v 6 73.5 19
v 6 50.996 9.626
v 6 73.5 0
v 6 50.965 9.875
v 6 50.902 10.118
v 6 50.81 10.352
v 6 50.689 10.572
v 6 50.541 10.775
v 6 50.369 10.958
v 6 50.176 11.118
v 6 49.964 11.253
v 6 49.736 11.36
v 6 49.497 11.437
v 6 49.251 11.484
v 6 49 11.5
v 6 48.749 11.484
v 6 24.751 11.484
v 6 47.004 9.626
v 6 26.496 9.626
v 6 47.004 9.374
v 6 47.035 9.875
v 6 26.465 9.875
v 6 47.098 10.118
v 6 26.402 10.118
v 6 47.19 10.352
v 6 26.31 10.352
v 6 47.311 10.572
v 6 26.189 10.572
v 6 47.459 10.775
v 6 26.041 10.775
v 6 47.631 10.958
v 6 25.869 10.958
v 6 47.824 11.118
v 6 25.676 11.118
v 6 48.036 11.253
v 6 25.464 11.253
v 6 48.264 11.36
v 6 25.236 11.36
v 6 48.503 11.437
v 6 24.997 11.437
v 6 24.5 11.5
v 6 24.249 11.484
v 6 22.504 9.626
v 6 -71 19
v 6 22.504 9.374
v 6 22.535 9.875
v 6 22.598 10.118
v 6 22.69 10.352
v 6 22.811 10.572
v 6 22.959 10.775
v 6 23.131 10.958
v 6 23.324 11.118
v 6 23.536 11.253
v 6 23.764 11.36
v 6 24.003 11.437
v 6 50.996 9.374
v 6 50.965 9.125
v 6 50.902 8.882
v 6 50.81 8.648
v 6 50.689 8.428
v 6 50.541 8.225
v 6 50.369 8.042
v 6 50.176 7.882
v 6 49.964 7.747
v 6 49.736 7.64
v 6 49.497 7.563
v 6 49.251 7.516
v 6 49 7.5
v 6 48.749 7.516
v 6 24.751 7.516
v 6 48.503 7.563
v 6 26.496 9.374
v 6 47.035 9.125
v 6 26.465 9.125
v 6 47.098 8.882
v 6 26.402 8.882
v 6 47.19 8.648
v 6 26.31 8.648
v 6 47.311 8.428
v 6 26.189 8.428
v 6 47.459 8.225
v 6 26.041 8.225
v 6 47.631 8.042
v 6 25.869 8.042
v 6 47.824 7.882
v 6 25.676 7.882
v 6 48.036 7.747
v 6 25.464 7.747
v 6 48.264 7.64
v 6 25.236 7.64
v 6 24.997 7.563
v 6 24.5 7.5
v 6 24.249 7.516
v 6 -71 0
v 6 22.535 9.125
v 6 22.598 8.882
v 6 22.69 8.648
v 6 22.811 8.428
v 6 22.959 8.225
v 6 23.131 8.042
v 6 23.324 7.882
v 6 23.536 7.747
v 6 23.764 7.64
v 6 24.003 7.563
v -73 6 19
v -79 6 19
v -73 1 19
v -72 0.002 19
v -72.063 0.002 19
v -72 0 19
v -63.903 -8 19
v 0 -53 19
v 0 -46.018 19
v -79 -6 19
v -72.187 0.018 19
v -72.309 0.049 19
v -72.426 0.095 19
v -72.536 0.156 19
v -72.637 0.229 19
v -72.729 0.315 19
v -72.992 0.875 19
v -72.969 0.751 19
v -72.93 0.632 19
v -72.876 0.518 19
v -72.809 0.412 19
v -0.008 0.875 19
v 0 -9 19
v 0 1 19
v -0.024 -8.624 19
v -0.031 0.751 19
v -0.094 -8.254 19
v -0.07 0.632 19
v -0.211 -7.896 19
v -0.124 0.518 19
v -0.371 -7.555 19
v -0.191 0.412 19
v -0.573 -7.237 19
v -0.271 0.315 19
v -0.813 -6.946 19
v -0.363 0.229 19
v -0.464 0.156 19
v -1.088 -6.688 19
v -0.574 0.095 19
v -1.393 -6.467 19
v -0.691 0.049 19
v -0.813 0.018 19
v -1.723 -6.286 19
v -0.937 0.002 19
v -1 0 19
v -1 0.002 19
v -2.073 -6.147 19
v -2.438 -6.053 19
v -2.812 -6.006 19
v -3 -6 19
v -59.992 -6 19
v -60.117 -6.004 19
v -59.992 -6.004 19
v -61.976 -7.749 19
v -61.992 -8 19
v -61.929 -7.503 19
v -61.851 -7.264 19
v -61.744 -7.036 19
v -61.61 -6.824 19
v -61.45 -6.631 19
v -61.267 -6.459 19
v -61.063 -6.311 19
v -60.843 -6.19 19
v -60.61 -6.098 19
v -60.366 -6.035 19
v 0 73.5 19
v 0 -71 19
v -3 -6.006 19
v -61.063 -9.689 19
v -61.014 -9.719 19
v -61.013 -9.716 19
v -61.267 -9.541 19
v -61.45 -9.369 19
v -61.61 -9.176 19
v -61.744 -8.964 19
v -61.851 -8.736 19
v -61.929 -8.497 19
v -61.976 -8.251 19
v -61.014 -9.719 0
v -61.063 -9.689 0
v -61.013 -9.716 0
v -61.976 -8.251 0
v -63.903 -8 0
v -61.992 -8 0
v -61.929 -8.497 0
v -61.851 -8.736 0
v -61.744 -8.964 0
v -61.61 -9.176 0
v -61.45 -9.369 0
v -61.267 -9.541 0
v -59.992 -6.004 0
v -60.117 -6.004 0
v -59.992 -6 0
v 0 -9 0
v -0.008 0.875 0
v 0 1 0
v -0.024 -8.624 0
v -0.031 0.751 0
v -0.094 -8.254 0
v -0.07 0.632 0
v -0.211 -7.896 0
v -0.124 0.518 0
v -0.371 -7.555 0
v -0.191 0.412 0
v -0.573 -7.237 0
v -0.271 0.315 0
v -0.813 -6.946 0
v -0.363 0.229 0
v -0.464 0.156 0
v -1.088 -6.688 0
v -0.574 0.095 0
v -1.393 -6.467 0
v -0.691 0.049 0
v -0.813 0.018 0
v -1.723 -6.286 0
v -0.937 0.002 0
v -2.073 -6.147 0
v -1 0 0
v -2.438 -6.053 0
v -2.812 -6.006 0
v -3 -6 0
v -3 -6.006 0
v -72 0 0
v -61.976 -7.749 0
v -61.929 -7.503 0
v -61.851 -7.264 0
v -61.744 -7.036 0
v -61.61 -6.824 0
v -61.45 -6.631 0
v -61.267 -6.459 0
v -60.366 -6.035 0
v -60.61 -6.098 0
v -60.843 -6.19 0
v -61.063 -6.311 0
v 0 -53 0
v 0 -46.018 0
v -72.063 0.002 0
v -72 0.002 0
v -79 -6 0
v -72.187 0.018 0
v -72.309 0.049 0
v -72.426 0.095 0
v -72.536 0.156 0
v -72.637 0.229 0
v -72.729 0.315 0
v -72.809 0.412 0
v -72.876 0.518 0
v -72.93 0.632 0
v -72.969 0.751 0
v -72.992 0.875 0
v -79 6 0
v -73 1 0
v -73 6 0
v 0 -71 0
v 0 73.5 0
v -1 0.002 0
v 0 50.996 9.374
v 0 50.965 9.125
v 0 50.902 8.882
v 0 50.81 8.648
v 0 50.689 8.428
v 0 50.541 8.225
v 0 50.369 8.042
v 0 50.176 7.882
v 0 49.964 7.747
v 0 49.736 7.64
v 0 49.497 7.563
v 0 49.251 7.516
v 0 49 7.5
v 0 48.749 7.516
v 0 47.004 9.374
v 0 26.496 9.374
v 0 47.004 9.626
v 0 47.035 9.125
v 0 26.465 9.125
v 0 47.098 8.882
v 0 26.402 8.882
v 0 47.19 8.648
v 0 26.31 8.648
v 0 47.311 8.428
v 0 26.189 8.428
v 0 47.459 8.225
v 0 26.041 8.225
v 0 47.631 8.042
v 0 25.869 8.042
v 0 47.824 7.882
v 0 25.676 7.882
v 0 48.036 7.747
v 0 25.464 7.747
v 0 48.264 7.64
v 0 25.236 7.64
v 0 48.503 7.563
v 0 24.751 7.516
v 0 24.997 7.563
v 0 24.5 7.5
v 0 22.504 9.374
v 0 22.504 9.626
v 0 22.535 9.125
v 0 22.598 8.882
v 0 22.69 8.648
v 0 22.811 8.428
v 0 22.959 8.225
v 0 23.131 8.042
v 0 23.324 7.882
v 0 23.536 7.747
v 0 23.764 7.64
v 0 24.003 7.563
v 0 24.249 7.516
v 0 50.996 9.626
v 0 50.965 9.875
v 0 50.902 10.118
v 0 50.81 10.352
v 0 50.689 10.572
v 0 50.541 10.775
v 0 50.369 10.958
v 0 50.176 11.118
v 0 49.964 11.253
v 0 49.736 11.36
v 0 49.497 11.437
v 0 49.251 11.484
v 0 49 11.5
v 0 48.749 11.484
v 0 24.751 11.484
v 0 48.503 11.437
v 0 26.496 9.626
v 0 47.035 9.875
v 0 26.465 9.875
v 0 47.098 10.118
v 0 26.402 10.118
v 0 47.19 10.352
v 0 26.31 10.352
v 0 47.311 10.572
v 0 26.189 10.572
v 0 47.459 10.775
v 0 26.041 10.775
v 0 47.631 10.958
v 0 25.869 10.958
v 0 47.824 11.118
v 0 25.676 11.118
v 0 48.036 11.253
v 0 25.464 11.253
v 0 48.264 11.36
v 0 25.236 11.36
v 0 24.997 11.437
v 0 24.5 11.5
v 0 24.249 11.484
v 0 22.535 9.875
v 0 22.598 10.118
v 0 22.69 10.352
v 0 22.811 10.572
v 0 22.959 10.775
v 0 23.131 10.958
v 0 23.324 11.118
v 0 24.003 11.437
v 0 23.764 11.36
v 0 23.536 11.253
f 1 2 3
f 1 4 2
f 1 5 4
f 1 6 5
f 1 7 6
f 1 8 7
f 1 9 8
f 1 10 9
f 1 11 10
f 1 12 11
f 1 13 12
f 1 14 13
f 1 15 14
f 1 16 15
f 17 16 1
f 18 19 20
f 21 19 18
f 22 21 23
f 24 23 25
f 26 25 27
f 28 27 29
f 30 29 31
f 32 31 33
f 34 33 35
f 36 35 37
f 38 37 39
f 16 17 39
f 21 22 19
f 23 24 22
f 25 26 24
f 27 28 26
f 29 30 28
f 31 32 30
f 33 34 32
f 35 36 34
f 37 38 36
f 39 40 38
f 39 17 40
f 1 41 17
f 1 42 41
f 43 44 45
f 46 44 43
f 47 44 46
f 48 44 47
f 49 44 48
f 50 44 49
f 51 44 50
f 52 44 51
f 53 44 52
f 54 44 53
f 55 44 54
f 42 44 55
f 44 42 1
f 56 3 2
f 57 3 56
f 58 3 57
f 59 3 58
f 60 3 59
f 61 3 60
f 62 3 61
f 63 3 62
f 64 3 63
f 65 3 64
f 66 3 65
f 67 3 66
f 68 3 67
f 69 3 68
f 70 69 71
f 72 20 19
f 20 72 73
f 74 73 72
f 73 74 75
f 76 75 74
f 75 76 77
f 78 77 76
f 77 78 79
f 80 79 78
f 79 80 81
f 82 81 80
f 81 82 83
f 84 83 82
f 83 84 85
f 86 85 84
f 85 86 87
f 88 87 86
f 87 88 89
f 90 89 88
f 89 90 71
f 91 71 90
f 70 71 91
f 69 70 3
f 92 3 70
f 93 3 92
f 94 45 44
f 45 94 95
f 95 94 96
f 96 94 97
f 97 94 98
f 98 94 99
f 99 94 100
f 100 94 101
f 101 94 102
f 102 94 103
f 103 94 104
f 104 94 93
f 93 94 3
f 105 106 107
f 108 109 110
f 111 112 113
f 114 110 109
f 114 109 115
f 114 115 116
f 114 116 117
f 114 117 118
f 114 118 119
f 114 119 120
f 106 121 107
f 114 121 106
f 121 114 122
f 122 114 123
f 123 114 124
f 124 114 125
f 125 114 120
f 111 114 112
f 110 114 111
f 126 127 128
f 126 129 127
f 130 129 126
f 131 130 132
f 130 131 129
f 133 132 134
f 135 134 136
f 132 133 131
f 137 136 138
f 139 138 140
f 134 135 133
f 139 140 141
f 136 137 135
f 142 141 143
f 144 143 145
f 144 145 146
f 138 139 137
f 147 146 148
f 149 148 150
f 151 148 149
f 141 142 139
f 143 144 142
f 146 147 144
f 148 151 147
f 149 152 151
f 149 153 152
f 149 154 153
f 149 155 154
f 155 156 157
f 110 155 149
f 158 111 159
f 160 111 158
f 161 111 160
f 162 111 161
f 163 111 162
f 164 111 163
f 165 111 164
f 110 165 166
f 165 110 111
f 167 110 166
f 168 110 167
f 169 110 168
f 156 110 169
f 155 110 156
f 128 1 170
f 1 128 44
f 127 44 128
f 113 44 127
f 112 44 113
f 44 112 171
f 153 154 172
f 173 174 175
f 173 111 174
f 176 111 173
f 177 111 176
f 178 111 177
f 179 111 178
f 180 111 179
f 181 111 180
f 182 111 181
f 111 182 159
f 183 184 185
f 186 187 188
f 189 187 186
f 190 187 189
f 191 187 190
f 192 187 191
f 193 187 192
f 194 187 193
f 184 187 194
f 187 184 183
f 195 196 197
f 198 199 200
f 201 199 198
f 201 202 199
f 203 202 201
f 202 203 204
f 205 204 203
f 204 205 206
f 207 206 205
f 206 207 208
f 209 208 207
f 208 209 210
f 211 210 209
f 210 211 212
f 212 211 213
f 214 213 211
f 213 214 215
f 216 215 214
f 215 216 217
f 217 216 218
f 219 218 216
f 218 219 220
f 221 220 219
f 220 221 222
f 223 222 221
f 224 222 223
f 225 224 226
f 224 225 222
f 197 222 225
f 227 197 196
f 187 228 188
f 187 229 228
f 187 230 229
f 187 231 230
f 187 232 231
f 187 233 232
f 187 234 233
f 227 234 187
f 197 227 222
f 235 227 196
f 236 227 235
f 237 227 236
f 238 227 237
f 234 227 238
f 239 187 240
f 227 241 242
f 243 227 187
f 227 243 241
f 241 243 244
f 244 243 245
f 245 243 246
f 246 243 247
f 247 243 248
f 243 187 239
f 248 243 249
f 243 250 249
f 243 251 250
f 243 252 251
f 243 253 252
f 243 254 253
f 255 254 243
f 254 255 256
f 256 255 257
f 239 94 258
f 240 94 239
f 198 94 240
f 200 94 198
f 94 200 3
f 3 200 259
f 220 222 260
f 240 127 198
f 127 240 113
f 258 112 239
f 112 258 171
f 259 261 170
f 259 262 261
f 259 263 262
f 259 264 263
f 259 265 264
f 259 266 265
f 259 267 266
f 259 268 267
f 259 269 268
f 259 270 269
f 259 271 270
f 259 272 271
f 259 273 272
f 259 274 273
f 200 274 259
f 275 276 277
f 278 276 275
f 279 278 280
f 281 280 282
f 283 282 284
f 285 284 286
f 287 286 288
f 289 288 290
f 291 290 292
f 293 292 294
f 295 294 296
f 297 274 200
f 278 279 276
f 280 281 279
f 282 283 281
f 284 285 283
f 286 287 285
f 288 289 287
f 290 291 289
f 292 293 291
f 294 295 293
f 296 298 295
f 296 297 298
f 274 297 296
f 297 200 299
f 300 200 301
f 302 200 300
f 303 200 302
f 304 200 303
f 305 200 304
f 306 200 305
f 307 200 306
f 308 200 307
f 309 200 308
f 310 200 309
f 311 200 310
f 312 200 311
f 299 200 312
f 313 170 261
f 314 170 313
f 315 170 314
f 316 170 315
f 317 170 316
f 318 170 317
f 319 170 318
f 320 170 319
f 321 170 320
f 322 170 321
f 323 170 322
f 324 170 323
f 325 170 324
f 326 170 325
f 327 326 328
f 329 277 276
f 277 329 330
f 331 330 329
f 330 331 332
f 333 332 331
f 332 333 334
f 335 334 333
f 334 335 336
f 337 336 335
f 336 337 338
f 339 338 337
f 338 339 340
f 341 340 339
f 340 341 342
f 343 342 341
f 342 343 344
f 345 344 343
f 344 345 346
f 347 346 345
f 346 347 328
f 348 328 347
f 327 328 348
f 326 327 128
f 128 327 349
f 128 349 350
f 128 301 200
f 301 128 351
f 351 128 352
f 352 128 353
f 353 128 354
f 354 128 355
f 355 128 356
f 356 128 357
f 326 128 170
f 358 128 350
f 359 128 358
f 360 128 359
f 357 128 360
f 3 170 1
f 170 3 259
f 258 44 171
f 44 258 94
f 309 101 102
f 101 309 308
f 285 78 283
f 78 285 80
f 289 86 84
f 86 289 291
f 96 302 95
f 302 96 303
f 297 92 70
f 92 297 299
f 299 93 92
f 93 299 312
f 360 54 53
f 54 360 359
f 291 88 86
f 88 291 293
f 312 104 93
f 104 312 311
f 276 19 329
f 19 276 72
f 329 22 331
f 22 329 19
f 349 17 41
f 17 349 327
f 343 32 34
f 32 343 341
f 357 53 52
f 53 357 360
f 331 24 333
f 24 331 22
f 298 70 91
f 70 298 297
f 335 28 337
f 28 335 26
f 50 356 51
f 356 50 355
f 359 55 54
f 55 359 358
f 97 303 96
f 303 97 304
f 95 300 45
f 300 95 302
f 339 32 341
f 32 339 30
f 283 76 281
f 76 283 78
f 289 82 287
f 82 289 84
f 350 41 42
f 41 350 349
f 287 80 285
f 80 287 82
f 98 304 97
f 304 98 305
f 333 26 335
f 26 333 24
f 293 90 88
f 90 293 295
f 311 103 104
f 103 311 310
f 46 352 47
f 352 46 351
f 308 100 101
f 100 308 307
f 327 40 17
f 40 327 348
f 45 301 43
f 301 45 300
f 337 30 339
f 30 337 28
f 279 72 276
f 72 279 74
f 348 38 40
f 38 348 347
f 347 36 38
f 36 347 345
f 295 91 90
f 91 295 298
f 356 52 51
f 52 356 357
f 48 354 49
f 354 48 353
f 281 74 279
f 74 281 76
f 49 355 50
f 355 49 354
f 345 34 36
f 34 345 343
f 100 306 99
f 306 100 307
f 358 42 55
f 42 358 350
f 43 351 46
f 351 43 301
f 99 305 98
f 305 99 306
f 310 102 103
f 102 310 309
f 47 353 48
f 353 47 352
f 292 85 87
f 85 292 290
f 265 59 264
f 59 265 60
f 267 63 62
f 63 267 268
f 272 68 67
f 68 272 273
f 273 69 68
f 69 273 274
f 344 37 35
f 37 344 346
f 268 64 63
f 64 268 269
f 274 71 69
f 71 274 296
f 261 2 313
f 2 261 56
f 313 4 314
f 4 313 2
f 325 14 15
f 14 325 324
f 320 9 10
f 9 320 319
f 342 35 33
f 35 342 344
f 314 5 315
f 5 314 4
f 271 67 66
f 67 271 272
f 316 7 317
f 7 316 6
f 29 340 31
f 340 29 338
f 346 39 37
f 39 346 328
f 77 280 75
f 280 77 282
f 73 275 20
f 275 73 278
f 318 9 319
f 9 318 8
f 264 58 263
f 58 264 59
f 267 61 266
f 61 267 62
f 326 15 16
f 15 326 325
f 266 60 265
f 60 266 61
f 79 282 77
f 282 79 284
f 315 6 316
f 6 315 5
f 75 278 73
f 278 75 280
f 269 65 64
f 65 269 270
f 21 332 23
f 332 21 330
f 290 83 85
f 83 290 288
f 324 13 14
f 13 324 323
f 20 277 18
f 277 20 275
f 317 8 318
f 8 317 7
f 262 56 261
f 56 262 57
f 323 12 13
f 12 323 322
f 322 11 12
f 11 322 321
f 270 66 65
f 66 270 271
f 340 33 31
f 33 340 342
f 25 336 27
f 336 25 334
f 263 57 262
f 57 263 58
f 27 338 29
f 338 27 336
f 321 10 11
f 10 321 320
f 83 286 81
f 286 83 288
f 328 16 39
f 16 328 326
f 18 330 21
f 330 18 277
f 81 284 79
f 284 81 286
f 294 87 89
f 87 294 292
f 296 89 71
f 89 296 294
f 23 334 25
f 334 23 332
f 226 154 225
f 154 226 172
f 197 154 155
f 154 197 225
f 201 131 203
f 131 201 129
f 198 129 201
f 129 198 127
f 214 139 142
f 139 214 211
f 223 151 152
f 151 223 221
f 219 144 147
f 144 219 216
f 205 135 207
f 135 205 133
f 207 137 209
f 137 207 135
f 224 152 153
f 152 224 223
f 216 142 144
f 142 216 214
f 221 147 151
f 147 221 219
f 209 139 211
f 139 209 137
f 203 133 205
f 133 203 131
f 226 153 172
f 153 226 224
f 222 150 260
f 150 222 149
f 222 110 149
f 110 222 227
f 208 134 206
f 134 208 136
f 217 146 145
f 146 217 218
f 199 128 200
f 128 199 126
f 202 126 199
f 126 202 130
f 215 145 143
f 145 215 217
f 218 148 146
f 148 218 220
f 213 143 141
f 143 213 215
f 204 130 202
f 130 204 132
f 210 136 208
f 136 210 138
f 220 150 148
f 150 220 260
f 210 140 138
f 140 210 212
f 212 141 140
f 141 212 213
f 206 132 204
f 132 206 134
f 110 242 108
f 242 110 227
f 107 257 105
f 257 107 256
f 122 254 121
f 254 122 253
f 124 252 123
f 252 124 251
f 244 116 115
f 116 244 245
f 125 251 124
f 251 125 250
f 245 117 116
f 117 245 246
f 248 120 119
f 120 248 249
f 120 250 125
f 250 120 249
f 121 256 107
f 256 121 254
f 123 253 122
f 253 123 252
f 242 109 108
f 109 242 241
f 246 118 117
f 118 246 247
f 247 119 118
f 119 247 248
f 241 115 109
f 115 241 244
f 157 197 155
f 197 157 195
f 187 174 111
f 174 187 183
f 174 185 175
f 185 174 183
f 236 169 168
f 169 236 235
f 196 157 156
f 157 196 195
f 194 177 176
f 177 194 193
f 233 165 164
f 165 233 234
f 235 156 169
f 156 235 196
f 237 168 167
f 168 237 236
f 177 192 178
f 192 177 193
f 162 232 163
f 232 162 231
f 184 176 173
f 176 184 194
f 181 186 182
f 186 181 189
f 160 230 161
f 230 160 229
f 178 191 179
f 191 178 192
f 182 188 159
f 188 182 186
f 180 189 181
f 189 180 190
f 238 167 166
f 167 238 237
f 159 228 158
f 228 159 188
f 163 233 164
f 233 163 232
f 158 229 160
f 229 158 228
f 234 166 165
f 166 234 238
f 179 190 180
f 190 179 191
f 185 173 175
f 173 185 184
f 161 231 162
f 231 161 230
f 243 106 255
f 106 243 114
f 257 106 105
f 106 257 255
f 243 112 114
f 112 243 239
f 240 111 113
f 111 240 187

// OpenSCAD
/* [user roll dimensions] */
    diametre_rouleau=200;// [150:200]
    epaisseur_rouleau=71;// [30:77]
    diametre_trou=53;// [32:60]

/* [Hidden] */
    es=6;//epaisseur structure
    Hauteur_z=19;
    GR=3;//grands rayons
    pr=1;//petits rayons
    preview_tab = "";

//Calculs dimensionnels
    epaulement=((diametre_rouleau/2)-(diametre_trou/2));//extérieur rouleau à bord trou du rouleau
    portee=(epaisseur_rouleau+2+es);//jeu=2
    longueur_renfort=sqrt((portee*portee)+((diametre_trou-es)*(diametre_trou-es)));//du bout de la portee au bord inférieur du trou du rouleau
    ang=atan(portee/(diametre_trou-es));//angle de rotation du renfort
    angsmall=180-(90+ang);//angle de la pointe de la portée
    sx=2*(sin (angsmall));//localisation en x du point de tangence du rayon sur le renfort
    sy=2*(cos (angsmall));//localisation en y du point de tangence du rayon sur le renfort
    lx=(sy+2)/(tan (angsmall));//localisation en x du point de tangence du rayon sur la portée
    decalage=es/(sin (angsmall));//longueur du chevauchement de la portée et du renfort

//Dessin du support mural
 union() {
        //Dessin de la partie au mur
        //Example: translate(v = [x, y, z]) { ... }
        //x=es;
        y=epaulement+diametre_trou+(es*3);
        z=Hauteur_z;
        //echo(box=[es, y, z]);
     
        difference () {
            translate([0,-(diametre_trou+(es*3)),0])
                cube([es,y,z],false);
            translate([-a4,epaulement/3,z/2])
                rotate ([0,90,0]) 
                    cylinder(es+2,r=2, $fn=50,center=false);
            translate([-a4,(epaulement/3)*2,z/2])
                rotate ([0,90,0]) 
                    cylinder(es+2,r=2, $fn=50,center=false);
         };
     
        //Dessin de la portee
        a=portee;
        translate([-a,-es,0])
            cube([a,es,z],false);
        
        //Dessin de la butée d'extrémité
        translate ([-a,0,0]) 
            cube([es,es,z],false);
        
        //Dessin du renfort
        b2=longueur_renfort;
        translate([0,-(diametre_trou),0])
            rotate([0,0,ang])
                cube([es,b2,z]);
        
        //Dessin du rayon mur-dessous portee
        a3=3;
        b3=3;
        translate([-a3,-(es+b3),0])
            difference(){
                cube([a3,b3,z],false);
                translate([0,0,-1])
                cylinder(z+2,r=a3,$fn=50,center=false);
            };//fin de la difference
        
        //Dessin du rayon mur-dessus portee
        a4=1;
        b4=1;
        r=a4;
        L4=z+2;
        
        difference(){
            translate([-a4,0,0])
                cube([a4,b4,z],false);
            translate([-a4,b4,-1])
                cylinder(L4,r, $fn=50,center=false);
            };//fin de la difference
        
        difference(){
            translate([-(a-es),0,0]) 
                cube([a4,b4,z],false);
            translate([-(a-es-a4),b4,-1])
                cylinder(L4,r, $fn=50,center=false);
            };//fin de la difference
        
        difference(){
            union (){
                translate([-(a-lx-decalage-sx),-es-2,0])
                    rotate ([0,0,90])
                        cube([2,lx+sx,z],false);
                translate([-(a-lx-decalage),-(es+2+sy),0])
                    rotate ([0,0,ang])
                        cube([2,lx+sx,z],false);
            };//fin de l'union
            translate ([-(a-lx-decalage-sx),-es-2,-1]) 
                cylinder (h=(z+2),r=2,$fn=50,center=false);
        };//fin de la difference
        
};//fin de l'union
// preview[view:south east, tilt:top diagonal]
